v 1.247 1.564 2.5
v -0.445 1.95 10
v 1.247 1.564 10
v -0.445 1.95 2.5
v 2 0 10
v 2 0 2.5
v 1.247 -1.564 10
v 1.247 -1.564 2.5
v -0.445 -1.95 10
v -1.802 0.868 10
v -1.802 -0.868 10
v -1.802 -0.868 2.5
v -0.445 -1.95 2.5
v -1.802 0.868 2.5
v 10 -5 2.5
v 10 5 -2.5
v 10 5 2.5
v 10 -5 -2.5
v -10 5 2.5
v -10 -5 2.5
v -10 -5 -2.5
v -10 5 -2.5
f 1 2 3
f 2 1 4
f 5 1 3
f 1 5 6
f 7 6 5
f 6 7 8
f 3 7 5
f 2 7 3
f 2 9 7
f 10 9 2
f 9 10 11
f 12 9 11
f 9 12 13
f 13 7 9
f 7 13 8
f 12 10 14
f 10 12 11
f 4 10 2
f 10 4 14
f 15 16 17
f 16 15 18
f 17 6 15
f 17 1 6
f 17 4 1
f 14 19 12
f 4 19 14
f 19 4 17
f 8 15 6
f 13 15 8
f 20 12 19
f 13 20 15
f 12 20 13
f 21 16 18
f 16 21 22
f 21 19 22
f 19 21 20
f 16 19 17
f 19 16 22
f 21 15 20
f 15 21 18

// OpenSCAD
rotate([180,0,0])
{
  !union()
  {
    cylinder(r=2, h=10);
    cube([20,10,5], center=true);
  }
};

// ROTATION 
// rotate([x, y, z]);
  translate([0, 160, 0])
  {
  rotate([45, -20, 45])
  cube([20, 40, 30], center=true);
  }
